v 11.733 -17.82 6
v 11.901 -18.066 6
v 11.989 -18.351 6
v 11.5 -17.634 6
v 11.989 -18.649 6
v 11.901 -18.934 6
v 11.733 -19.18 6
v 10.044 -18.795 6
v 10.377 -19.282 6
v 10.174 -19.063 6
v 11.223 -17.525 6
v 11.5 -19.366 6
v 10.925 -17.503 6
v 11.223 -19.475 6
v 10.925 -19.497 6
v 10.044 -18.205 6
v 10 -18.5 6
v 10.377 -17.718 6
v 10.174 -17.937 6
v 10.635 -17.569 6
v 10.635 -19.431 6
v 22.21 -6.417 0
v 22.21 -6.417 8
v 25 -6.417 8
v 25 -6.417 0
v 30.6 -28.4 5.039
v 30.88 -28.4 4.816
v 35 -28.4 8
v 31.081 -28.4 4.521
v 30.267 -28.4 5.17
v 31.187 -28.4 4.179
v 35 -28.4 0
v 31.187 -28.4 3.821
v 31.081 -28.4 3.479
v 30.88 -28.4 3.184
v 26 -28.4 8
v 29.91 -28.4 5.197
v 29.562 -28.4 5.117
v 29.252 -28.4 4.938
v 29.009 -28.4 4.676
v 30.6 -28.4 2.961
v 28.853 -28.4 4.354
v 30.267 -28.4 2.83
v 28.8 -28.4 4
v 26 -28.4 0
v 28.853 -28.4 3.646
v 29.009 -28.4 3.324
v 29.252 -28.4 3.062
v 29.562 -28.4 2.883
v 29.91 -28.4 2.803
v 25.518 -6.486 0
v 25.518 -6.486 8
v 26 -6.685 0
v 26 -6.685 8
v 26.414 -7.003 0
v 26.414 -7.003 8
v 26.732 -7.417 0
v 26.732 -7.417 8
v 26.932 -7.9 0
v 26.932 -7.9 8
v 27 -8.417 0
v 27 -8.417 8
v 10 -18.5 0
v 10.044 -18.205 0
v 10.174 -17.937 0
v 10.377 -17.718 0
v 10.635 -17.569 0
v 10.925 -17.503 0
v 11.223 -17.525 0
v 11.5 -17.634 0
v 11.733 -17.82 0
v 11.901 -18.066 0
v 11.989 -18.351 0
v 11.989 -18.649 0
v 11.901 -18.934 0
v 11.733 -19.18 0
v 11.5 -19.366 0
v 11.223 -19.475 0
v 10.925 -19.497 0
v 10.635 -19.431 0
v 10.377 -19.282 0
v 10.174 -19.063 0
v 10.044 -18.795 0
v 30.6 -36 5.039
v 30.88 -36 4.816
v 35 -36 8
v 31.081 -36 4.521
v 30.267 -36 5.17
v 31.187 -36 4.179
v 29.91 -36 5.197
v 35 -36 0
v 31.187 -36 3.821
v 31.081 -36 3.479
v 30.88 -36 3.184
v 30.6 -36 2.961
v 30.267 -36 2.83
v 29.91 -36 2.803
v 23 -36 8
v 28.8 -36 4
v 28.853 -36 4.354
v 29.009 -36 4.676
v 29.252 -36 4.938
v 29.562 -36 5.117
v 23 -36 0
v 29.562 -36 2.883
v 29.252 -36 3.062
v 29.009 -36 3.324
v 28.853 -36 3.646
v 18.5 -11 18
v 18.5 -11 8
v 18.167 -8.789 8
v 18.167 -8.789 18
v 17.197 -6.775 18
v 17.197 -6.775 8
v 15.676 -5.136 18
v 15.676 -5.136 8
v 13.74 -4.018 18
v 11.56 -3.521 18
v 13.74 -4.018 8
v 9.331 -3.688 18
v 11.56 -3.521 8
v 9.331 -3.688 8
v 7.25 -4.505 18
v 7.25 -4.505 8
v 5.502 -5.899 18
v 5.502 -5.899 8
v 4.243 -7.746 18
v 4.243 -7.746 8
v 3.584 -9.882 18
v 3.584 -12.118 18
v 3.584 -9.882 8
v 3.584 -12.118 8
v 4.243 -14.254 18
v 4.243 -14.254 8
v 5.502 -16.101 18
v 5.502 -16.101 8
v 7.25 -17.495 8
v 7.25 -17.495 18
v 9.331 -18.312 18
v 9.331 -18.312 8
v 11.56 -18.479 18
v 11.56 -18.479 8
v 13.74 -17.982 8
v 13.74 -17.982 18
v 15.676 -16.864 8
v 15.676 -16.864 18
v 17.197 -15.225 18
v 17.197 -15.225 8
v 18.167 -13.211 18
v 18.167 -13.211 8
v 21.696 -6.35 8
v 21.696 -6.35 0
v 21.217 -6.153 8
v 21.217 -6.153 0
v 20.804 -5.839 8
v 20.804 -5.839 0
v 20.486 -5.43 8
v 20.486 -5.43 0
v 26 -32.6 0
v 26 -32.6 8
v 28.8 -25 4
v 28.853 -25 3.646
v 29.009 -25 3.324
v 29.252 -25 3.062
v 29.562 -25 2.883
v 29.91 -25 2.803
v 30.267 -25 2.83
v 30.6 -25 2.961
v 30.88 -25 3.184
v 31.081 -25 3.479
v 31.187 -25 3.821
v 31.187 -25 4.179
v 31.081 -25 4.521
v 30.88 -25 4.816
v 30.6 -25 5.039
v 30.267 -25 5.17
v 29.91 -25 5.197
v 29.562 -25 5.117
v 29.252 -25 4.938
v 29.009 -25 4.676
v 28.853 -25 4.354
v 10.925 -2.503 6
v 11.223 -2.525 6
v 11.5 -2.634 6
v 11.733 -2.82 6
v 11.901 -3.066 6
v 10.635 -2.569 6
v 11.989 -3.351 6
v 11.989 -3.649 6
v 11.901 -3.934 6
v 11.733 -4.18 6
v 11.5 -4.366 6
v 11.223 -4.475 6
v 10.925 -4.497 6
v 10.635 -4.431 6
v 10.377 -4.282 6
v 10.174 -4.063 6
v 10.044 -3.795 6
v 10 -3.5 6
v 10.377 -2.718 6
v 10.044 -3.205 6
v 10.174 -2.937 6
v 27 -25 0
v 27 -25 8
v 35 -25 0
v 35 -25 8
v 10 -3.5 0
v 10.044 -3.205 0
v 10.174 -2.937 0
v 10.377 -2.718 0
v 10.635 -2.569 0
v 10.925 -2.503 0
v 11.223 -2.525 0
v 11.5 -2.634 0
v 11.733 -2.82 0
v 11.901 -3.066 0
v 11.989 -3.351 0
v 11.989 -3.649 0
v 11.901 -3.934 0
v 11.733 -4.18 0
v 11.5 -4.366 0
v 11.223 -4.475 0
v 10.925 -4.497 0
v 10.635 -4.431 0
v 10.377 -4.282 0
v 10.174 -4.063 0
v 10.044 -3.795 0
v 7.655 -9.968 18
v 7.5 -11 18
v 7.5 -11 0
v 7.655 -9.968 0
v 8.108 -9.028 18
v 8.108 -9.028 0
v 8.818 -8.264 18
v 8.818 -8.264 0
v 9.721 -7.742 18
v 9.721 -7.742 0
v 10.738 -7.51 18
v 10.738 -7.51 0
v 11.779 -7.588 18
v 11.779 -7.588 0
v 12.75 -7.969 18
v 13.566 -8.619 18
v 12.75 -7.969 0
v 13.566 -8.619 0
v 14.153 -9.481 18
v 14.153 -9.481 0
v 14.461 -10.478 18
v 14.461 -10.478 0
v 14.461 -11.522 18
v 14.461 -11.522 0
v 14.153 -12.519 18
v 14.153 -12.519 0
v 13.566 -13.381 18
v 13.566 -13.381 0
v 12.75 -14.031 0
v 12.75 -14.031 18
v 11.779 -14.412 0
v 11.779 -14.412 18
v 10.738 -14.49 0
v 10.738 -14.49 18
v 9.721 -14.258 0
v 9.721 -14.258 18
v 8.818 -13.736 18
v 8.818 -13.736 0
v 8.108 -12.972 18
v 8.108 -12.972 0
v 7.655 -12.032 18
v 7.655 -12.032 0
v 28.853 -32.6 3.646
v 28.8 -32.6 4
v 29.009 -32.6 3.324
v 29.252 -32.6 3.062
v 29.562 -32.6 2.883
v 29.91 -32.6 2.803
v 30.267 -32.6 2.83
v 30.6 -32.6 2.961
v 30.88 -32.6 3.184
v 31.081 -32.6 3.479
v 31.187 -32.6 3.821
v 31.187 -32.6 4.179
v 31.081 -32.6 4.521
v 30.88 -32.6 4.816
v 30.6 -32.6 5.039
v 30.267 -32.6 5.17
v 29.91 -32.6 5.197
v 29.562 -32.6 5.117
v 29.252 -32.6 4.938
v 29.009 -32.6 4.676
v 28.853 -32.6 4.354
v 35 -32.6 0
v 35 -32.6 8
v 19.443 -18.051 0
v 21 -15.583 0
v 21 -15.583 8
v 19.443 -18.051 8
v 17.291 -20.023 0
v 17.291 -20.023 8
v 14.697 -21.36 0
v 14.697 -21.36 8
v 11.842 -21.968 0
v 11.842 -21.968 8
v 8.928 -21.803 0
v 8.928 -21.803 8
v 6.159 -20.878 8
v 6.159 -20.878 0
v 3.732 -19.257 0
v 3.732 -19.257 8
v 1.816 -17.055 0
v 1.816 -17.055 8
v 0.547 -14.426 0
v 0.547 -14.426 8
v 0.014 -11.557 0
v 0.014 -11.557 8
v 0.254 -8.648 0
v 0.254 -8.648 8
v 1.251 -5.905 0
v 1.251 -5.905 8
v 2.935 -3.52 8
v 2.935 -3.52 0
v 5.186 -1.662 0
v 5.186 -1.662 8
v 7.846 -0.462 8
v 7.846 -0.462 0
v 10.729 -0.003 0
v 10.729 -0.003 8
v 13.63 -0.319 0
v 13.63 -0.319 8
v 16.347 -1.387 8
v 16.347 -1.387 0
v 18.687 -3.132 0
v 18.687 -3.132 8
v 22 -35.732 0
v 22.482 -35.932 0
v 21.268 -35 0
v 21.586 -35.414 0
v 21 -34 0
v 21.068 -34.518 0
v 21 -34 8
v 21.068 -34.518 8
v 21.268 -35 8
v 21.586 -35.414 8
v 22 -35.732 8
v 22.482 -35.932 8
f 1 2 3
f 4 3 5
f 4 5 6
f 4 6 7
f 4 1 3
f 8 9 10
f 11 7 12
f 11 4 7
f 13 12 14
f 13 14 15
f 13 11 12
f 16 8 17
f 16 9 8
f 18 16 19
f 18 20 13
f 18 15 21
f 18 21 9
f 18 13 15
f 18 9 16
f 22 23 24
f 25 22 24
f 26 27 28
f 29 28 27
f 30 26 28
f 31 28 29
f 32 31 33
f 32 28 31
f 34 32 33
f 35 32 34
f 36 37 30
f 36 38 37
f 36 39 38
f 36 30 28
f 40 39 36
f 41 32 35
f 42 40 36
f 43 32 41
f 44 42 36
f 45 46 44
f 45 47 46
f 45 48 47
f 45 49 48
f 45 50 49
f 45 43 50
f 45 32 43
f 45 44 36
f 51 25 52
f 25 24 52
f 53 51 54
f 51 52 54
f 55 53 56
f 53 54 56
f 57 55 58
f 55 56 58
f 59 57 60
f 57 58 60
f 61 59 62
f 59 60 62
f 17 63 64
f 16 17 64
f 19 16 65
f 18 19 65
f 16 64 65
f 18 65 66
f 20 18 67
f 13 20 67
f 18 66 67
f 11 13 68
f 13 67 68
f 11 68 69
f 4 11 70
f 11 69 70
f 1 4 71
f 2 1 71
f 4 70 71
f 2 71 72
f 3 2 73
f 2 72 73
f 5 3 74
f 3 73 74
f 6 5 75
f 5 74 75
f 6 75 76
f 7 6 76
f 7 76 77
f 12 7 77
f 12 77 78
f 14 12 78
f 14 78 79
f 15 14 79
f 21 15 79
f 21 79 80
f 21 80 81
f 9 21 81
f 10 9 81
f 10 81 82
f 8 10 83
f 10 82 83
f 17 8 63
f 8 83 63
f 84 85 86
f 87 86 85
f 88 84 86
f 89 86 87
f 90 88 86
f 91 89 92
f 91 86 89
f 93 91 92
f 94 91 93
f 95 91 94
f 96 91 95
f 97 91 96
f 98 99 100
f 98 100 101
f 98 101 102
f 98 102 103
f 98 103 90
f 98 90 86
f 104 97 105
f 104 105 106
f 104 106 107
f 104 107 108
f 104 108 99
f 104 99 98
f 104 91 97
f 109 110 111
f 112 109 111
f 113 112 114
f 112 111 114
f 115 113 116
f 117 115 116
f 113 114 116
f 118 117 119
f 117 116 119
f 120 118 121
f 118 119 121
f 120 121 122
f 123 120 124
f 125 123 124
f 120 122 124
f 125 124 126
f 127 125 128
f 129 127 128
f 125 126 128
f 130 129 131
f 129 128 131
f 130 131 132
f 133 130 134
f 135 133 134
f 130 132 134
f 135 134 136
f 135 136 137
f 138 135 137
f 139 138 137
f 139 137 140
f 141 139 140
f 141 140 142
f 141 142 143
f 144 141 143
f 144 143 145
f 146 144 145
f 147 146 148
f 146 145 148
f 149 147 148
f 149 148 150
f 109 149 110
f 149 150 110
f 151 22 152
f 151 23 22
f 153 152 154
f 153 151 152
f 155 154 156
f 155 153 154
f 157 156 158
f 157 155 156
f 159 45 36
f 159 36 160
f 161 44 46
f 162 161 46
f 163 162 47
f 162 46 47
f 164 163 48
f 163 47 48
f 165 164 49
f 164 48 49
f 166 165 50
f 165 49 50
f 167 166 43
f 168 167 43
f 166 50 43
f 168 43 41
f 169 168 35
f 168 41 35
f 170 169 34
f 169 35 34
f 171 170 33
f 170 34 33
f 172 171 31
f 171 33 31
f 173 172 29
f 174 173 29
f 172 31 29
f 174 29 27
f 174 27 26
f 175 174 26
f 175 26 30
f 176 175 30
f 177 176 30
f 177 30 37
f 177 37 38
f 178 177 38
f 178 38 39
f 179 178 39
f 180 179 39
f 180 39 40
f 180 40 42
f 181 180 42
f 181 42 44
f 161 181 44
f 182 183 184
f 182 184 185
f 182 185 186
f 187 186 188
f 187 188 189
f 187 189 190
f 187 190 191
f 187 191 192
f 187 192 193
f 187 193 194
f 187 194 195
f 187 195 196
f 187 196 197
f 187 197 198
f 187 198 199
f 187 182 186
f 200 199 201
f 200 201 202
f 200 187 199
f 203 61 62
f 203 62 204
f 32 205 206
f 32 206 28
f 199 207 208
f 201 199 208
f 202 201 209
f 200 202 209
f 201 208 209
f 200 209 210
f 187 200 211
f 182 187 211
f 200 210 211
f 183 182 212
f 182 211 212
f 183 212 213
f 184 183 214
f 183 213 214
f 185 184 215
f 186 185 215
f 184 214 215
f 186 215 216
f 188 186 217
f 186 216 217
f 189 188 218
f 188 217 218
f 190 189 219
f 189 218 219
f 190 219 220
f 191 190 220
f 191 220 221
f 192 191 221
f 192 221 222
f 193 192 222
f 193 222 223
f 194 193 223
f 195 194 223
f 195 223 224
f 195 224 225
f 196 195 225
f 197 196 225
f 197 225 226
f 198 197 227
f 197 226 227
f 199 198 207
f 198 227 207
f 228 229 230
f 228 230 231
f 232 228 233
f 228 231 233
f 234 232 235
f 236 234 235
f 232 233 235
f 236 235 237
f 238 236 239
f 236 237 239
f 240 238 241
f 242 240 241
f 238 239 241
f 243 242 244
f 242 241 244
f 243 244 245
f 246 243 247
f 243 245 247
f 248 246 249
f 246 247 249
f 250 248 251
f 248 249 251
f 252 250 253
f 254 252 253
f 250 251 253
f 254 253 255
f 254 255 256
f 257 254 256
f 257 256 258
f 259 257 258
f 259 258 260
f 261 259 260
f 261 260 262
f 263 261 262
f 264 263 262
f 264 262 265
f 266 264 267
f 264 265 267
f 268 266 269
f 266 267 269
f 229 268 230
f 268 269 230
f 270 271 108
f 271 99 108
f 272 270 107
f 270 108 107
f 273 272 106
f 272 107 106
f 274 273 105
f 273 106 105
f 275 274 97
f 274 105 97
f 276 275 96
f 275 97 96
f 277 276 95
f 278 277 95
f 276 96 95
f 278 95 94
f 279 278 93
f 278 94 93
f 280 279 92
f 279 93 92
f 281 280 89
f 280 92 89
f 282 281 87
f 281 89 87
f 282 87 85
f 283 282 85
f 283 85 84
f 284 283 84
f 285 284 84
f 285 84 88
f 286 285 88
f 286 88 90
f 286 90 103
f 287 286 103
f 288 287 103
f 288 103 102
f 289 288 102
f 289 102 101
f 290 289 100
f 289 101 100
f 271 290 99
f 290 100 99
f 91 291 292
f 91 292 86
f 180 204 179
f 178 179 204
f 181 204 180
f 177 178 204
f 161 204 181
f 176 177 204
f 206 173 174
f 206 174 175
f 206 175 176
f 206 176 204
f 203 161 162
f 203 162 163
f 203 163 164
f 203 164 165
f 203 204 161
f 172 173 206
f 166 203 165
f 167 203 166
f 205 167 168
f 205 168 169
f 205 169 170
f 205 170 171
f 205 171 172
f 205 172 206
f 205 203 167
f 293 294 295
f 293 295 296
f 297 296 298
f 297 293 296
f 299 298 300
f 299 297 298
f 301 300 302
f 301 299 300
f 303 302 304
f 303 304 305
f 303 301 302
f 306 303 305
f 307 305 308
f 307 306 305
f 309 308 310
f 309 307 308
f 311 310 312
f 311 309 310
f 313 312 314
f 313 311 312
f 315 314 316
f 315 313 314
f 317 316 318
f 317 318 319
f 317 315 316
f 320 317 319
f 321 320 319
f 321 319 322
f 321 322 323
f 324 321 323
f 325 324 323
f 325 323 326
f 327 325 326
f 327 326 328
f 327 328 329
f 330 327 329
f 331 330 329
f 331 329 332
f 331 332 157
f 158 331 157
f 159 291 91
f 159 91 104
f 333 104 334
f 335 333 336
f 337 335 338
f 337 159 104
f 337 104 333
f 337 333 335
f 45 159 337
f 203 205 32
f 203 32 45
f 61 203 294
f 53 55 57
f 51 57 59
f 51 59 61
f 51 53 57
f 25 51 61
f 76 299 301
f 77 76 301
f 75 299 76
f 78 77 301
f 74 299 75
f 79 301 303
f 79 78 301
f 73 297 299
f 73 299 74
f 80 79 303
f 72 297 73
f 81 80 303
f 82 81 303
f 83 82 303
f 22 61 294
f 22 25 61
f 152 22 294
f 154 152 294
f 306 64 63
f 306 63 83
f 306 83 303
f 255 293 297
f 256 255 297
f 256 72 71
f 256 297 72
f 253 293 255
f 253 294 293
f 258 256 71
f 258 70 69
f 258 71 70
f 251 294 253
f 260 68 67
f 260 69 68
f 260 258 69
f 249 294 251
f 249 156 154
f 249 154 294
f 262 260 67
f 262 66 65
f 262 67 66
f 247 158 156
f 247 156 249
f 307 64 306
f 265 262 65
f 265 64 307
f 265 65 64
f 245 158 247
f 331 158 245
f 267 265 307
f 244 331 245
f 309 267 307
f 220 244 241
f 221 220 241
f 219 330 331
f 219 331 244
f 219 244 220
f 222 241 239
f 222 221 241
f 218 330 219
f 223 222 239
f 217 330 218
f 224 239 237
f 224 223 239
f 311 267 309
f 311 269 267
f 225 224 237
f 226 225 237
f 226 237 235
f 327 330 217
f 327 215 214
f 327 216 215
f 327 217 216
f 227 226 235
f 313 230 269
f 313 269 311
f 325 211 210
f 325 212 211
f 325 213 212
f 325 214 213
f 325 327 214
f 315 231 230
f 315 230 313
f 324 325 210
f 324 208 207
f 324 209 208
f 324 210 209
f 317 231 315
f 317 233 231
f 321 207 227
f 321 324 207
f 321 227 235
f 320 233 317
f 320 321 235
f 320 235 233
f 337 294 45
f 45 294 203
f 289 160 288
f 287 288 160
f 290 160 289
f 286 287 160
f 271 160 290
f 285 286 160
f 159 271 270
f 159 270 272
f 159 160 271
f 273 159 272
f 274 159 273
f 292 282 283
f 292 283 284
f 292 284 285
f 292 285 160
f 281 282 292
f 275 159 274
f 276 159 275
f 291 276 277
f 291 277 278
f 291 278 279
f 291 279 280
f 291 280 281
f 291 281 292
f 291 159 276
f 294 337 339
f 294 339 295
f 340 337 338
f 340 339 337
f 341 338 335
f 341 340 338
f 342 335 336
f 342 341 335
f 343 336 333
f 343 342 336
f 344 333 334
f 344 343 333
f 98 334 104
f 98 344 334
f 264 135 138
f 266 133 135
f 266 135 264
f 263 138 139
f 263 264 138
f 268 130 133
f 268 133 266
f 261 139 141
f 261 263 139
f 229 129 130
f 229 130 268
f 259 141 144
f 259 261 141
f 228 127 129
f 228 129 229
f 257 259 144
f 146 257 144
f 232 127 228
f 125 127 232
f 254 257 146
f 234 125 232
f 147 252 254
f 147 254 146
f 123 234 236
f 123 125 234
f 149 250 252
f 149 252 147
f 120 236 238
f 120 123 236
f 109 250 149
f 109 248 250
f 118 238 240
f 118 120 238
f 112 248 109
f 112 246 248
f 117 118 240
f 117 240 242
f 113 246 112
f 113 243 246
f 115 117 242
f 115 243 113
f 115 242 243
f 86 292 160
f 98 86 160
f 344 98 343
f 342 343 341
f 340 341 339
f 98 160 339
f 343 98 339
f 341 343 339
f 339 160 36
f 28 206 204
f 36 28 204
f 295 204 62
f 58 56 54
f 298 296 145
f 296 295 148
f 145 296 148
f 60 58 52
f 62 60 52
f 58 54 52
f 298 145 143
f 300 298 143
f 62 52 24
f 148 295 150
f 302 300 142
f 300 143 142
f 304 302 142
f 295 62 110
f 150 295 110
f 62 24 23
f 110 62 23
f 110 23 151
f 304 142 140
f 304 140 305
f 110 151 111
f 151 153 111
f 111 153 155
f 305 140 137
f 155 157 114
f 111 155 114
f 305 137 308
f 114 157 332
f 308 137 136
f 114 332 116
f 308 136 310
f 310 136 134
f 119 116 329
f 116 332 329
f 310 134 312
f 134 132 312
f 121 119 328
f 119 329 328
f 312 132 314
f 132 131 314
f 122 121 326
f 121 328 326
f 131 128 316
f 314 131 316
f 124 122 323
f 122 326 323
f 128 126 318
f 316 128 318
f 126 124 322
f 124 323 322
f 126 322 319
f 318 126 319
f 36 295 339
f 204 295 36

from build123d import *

# Parameters (mm, degrees)
BOSS_EXTRU_1_DEPTH      = 8
ENL_V_MAT_EXTRU_1_REACH = 45.749
ESQUISSE2_R             = 1
D_GAGEMENT_M21_D        = 2.4
D_GAGEMENT_M21_DEPTH    = 11
D_GAGEMENT_M21_TIP      = 0.721032743
CONG_1_R                = 2
ESQUISSE5_R             = 7.5
BOSS_EXTRU_2_DEPTH      = 10
ESQUISSE6_R             = 1
ENL_V_MAT_EXTRU_2_DEPTH = 6
ESQUISSE8_R             = 3.5
ENL_V_MAT_EXTRU_3_DEPTH = 18


with BuildPart() as part:
    # Esquisse1 → Boss.-Extru.1 (new body)
    with BuildSketch(Plane.XY):
        with BuildLine():
            Line((21, -6.417424305), (27, -6.417424305))
            Line((27, -6.417424305), (27, -25))
            Line((27, -25), (35, -25))
            Line((35, -25), (35, -28.4))
            Line((35, -28.4), (26, -28.4))
            Line((26, -28.4), (26, -32.6))
            Line((26, -32.6), (35, -32.6))
            Line((35, -32.6), (35, -36))
            Line((35, -36), (21, -36))
            Line((21, -36), (21, -15.582575695))
            ThreePointArc((21, -15.582575695), (0, -11), (21, -6.417424305))
        make_face()
    extrude(amount=BOSS_EXTRU_1_DEPTH)

    # Enlèv. mat.-Extru.1: up to this face of the body (flat: up to its plane)
    enl_v_mat_extru_1_end = Plane(part.part.faces().sort_by_distance((28, -36, 4))[0])
    # Esquisse2 → Enlèv. mat.-Extru.1 (cut, up to the picked face)
    with BuildSketch(Plane(origin=(0, -25, 0), x_dir=(1, 0, 0), z_dir=(0, 1, 0)), mode=Mode.PRIVATE) as enl_v_mat_extru_1_sk1:
        with Locations(Location((30, -4, 0), (0, 0, 270))):
            Circle(ESQUISSE2_R)
    enl_v_mat_extru_1_tool1 = split(extrude(enl_v_mat_extru_1_sk1.sketch, amount=-ENL_V_MAT_EXTRU_1_REACH, mode=Mode.PRIVATE), bisect_by=enl_v_mat_extru_1_end, keep=Keep.BOTH, mode=Mode.PRIVATE)
    add(enl_v_mat_extru_1_tool1.solids().sort_by(Axis((30, -25, 4), (0, -1, 0)))[0], mode=Mode.SUBTRACT)

    # Dégagement M21
    with Locations(Plane(origin=(0, -25, 0), x_dir=(1, 0, 0), z_dir=(0, 1, 0))):
        with Locations((30, -4)):
            Hole(D_GAGEMENT_M21_D / 2, depth=D_GAGEMENT_M21_DEPTH)
            with Locations((0, 0, -(D_GAGEMENT_M21_DEPTH + D_GAGEMENT_M21_TIP / 2))):  # 118° drill point
                Cone(0, D_GAGEMENT_M21_D / 2, D_GAGEMENT_M21_TIP, mode=Mode.SUBTRACT)

    # Congé1
    cong_1_edges = [part.edges().sort_by_distance(p)[0] for p in [
        (21, -36, 4),
        (21, -6.417424305, 4),
        (27, -6.417424305, 4),
    ]]
    fillet(cong_1_edges, radius=CONG_1_R)

    # Esquisse5 → Boss.-Extru.2 (add)
    with BuildSketch(Plane.XY.offset(8)):
        with Locations((11, -11)):
            Circle(ESQUISSE5_R)
    extrude(amount=BOSS_EXTRU_2_DEPTH)

    # Esquisse6 → Enlèv. mat.-Extru.2 (cut)
    with BuildSketch(Plane(origin=(0, 0, 0), x_dir=(-1, 0, 0), z_dir=(0, 0, -1))):
        with Locations((-11, -3.5)):
            Circle(ESQUISSE6_R)
        with Locations((-11, -18.5)):
            Circle(ESQUISSE6_R)
    extrude(amount=-ENL_V_MAT_EXTRU_2_DEPTH, mode=Mode.SUBTRACT)

    # Esquisse8 → Enlèv. mat.-Extru.3 (cut)
    with BuildSketch(Plane(origin=(0, 0, 0), x_dir=(-1, 0, 0), z_dir=(0, 0, -1))):
        with Locations((-11, -11)):
            Circle(ESQUISSE8_R)
    extrude(amount=-ENL_V_MAT_EXTRU_3_DEPTH, mode=Mode.SUBTRACT)


solid = part.part
